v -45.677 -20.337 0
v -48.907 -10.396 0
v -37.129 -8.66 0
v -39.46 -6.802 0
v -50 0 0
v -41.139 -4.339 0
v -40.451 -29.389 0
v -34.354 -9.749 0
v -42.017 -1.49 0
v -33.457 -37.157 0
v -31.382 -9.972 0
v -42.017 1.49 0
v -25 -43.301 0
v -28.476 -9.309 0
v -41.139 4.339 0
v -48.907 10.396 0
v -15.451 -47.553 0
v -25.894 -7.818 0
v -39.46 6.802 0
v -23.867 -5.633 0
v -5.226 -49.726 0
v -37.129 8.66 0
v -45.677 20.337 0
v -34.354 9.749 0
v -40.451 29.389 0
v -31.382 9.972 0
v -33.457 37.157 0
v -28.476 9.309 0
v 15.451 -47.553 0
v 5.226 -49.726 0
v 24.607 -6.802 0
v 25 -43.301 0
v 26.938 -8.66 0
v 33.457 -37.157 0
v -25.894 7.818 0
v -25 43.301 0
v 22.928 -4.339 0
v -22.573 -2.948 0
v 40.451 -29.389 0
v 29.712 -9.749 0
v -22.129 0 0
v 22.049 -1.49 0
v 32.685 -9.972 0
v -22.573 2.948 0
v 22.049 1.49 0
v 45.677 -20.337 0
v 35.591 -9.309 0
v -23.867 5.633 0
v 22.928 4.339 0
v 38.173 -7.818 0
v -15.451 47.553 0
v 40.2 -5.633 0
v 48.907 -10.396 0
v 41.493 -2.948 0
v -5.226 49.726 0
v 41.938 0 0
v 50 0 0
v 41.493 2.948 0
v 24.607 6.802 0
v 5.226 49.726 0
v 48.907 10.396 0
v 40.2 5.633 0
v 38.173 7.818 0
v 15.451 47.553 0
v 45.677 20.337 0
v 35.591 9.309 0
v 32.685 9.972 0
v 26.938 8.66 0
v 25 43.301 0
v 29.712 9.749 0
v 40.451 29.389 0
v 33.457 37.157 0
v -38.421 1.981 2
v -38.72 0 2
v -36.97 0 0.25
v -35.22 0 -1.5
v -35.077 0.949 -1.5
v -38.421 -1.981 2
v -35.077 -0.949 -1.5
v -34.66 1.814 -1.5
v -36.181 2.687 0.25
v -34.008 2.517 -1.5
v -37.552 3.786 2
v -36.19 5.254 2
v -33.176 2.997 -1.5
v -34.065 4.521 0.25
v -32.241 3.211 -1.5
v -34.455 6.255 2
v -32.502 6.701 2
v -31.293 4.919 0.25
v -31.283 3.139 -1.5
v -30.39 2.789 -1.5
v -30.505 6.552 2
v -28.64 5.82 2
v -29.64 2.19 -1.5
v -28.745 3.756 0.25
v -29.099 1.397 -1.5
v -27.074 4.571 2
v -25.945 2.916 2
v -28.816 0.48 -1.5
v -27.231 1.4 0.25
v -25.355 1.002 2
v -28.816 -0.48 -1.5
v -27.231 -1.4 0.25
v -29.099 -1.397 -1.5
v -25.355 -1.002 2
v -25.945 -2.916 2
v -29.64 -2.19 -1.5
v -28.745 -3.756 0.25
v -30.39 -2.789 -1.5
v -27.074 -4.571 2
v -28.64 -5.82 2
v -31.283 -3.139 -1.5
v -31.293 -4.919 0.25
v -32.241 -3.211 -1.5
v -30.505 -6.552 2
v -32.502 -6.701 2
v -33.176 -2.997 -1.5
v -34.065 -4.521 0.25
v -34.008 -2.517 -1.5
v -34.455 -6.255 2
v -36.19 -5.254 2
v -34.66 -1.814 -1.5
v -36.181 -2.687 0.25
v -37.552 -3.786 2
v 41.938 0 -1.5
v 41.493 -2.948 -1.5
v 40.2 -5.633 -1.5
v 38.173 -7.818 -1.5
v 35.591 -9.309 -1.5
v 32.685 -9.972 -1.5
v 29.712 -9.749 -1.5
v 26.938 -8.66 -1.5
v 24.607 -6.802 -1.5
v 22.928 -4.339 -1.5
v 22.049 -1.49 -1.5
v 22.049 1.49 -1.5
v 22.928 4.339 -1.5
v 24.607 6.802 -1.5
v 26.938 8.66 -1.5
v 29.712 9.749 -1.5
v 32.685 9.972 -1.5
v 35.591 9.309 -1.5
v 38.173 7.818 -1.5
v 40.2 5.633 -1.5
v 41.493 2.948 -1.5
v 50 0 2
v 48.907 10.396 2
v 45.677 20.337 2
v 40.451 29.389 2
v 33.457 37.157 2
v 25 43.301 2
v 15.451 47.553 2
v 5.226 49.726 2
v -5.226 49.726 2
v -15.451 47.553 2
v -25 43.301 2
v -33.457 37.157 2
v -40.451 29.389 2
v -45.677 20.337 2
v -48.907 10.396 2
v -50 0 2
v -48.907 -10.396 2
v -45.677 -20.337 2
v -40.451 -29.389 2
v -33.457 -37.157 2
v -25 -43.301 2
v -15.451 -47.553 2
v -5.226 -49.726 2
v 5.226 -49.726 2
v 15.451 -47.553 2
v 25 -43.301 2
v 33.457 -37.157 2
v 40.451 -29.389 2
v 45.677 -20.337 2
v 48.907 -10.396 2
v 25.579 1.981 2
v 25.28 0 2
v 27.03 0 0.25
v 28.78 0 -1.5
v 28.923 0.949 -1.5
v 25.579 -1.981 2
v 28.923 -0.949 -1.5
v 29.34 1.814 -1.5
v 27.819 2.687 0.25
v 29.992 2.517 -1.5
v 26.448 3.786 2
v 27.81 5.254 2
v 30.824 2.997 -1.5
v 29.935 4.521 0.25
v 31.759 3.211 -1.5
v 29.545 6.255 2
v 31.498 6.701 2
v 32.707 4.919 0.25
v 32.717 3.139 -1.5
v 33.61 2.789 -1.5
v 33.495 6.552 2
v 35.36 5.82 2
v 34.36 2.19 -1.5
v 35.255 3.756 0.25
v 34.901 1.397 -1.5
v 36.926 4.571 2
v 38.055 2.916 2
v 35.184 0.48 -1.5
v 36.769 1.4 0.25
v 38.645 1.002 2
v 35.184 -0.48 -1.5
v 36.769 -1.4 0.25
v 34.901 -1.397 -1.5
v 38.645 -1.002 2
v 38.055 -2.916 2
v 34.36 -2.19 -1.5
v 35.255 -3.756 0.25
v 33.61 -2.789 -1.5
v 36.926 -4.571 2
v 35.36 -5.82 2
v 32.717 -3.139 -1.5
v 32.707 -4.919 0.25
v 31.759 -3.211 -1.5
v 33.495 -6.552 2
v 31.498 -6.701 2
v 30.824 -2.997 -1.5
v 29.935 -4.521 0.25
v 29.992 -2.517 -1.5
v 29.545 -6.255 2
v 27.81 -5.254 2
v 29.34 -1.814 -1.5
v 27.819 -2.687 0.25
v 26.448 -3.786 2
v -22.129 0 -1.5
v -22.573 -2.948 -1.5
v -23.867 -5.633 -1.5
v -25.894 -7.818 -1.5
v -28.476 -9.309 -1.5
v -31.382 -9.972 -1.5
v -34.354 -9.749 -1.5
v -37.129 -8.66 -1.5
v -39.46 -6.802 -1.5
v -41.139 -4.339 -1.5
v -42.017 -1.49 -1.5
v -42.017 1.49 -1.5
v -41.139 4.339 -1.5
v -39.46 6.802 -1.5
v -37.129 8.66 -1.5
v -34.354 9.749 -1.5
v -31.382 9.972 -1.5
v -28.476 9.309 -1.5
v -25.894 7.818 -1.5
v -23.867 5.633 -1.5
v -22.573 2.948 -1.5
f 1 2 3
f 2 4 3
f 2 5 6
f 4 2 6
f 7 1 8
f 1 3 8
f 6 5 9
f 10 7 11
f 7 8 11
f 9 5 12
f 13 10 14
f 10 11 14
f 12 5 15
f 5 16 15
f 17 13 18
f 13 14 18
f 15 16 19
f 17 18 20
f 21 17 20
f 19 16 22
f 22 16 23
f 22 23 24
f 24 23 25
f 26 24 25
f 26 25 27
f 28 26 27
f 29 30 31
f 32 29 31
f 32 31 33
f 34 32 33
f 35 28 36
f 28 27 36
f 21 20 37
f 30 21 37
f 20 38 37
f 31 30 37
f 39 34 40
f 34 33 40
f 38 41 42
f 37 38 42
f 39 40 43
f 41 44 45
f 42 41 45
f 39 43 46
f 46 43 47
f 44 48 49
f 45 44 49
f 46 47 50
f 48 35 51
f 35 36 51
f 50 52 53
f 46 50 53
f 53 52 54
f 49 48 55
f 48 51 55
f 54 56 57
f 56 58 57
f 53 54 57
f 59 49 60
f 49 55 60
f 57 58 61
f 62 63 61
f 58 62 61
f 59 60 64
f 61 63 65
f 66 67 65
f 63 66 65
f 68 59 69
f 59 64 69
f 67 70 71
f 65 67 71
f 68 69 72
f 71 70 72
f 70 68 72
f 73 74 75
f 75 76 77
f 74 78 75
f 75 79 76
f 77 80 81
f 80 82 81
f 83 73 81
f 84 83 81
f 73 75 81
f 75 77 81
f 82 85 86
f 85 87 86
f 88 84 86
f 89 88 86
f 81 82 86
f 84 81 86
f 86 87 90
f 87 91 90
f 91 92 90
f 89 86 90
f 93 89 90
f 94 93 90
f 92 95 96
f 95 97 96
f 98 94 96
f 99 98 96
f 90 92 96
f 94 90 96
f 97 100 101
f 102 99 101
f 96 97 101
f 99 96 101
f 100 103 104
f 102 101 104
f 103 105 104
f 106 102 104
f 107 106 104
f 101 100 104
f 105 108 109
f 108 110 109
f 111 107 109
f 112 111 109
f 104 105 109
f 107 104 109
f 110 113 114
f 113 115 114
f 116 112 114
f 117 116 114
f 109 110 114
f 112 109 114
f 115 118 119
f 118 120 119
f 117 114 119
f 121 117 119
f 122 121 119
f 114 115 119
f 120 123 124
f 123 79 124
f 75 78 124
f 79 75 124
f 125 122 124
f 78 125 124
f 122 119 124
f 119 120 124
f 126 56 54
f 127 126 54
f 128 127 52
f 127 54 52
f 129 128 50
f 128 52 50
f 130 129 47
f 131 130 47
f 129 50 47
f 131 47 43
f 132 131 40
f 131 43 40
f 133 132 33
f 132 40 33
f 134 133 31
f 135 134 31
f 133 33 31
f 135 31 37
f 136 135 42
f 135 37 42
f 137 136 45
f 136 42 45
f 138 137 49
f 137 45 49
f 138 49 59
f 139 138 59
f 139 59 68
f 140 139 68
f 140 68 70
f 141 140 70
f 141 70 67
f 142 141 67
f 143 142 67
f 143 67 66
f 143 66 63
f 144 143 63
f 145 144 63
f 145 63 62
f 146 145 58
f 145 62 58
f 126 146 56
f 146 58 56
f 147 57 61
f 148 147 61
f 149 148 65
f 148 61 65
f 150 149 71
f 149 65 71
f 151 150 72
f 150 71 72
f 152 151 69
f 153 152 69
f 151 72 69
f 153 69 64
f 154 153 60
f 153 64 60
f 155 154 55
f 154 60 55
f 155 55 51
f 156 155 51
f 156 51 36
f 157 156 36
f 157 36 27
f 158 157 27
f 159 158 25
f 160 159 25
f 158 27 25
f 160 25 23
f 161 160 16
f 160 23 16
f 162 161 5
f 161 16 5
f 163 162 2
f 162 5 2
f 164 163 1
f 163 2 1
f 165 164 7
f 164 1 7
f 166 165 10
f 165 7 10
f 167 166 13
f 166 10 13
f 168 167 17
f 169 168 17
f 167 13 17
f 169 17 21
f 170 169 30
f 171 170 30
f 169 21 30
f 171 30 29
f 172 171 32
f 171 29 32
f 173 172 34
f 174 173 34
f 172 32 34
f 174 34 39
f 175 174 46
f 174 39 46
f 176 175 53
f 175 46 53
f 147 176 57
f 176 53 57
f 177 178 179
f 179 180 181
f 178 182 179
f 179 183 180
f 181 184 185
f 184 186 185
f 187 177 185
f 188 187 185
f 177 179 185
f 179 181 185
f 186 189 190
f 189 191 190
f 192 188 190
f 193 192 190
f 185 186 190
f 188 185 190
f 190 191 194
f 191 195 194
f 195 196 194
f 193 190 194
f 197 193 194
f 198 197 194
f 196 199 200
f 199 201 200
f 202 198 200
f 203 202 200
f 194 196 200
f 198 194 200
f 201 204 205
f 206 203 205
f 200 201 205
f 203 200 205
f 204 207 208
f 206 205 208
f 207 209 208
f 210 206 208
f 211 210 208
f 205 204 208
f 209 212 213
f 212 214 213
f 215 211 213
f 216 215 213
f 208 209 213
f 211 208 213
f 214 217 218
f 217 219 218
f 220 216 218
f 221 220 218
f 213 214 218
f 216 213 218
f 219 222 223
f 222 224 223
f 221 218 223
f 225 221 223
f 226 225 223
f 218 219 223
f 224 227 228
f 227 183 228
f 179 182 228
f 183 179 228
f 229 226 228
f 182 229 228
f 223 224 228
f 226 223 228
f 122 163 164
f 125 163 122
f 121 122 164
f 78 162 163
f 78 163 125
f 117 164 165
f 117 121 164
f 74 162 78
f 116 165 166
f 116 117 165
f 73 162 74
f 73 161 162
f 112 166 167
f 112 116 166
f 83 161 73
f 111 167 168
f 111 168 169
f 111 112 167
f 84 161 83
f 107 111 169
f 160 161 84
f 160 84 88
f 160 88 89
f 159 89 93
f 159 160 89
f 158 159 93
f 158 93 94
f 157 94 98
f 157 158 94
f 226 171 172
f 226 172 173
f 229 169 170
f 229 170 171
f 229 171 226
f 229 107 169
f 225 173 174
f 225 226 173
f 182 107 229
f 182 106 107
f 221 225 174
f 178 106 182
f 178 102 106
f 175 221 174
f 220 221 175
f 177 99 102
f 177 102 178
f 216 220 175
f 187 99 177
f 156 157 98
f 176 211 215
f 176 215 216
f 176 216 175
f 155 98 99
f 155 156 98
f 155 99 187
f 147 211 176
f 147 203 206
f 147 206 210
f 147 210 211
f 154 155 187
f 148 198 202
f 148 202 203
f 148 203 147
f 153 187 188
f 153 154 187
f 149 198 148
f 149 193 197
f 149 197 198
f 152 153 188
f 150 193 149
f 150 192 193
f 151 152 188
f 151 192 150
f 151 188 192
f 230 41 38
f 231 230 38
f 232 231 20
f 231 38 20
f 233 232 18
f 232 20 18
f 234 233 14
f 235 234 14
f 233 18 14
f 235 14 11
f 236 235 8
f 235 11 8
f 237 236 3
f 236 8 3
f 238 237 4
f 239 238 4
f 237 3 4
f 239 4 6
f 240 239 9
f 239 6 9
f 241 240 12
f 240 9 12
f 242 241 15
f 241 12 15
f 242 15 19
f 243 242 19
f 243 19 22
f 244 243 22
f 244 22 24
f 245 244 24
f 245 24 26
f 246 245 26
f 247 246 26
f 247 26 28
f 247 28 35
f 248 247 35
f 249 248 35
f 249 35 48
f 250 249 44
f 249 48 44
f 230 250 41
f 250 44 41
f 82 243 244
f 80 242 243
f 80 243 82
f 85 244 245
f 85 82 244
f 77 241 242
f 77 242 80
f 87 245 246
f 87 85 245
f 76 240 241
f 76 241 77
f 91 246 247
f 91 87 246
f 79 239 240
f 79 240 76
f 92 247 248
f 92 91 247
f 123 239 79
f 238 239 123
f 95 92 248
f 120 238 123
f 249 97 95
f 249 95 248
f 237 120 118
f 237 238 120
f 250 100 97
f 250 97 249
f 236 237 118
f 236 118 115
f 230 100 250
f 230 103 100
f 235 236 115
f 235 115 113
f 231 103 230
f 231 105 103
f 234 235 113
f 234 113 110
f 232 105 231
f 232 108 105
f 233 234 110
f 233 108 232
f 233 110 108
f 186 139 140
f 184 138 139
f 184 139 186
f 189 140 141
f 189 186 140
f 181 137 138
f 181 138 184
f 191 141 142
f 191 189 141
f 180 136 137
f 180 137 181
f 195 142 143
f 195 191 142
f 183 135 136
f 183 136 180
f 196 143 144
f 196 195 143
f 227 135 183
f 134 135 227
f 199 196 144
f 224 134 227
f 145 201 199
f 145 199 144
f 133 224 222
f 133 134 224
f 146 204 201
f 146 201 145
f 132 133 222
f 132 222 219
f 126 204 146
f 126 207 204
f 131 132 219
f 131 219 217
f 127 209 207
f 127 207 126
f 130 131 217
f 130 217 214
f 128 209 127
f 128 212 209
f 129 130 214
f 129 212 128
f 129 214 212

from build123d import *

# Parameters (mm, degrees)
F0_R           = 50
F1_DEPTH       = 2
F3_R           = 10
F4_DEPTH       = 1.5
F5_D           = 6.4
F5_CSINK_D     = 13.44
F5_CSINK_ANGLE = 90


with BuildPart() as f1:
    # F0 (on Top) → F1 (new body)
    with BuildSketch(Plane.XY):
        Circle(F0_R)
    extrude(amount=F1_DEPTH)

    # F3 (on face) → F4 (join)
    with BuildSketch(Plane(origin=(0, 0, 0), x_dir=(1, 0, 0), z_dir=(0, 0, -1))):
        with Locations((31.9376476109, 0)):
            Circle(F3_R)
        with Locations((-32.1291722357, 0)):
            Circle(F3_R)
    extrude(amount=F4_DEPTH)

    # F5 (through all)
    with Locations(Plane.XY.offset(2)):
        with Locations((-32, 0), (32, 0)):
            CounterSinkHole(F5_D / 2, F5_CSINK_D / 2, counter_sink_angle=F5_CSINK_ANGLE)


solid = f1.part
